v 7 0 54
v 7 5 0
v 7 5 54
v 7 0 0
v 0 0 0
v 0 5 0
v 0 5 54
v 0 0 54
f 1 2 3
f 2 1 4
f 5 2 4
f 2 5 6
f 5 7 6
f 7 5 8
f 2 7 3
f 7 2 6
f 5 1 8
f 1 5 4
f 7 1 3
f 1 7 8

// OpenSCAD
translate([3.5, 2.5, 1.5]) color([0.18497194139743833, 0.12389516442443171, 0.21057650988664645]) cube([7, 5, 3], center=true);
translate([3.5, 2.5, 4.5]) color([0.8007465903541809, 0.9369691586445807, 0.022782575668658378]) cube([7, 5, 3], center=true);
translate([3.5, 2.5, 7.5]) color([0.42561883196681716, 0.10150021937416975, 0.259919889792832]) cube([7, 5, 3], center=true);
translate([3.5, 2.5, 10.5]) color([0.22082927131631735, 0.6469257198353225, 0.3502939673965323]) cube([7, 5, 3], center=true);
translate([3.5, 2.5, 13.5]) color([0.18031790152968785, 0.5036365052098872, 0.03937870708469238]) cube([7, 5, 3], center=true);
translate([3.5, 2.5, 16.5]) color([0.10092124118896661, 0.9882351487225011, 0.19935579046706298]) cube([7, 5, 3], center=true);
translate([3.5, 2.5, 19.5]) color([0.35855530131160185, 0.7315983062253606, 0.8383265651934163]) cube([7, 5, 3], center=true);
translate([3.5, 2.5, 22.5]) color([0.9184820619953314, 0.16942460609746768, 0.6726405635730526]) cube([7, 5, 3], center=true);
translate([3.5, 2.5, 25.5]) color([0.9665489030431832, 0.05805094382649867, 0.6762017842993783]) cube([7, 5, 3], center=true);
translate([3.5, 2.5, 28.5]) color([0.8454245937016164, 0.342312541078584, 0.25068733928511167]) cube([7, 5, 3], center=true);
translate([3.5, 2.5, 31.5]) color([0.596791393469411, 0.44231403369907896, 0.17481948445144113]) cube([7, 5, 3], center=true);
translate([3.5, 2.5, 34.5]) color([0.47162541509628797, 0.40990539565755457, 0.5691127395242802]) cube([7, 5, 3], center=true);
translate([3.5, 2.5, 37.5]) color([0.5086001300626332, 0.3114460010002068, 0.35715168259026286]) cube([7, 5, 3], center=true);
translate([3.5, 2.5, 40.5]) color([0.837661174368979, 0.25093266482213705, 0.560600218853524]) cube([7, 5, 3], center=true);
translate([3.5, 2.5, 43.5]) color([0.012436318829314397, 0.7415743774106636, 0.3359165544734606]) cube([7, 5, 3], center=true);
translate([3.5, 2.5, 46.5]) color([0.04569649356841665, 0.28088316421834825, 0.24013040782635398]) cube([7, 5, 3], center=true);
translate([3.5, 2.5, 49.5]) color([0.9531293398277989, 0.35222556151550743, 0.2878779148564]) cube([7, 5, 3], center=true);
translate([3.5, 2.5, 52.5]) color([0.35920119725374633, 0.9469058356578911, 0.6337478522492526]) cube([7, 5, 3], center=true);
